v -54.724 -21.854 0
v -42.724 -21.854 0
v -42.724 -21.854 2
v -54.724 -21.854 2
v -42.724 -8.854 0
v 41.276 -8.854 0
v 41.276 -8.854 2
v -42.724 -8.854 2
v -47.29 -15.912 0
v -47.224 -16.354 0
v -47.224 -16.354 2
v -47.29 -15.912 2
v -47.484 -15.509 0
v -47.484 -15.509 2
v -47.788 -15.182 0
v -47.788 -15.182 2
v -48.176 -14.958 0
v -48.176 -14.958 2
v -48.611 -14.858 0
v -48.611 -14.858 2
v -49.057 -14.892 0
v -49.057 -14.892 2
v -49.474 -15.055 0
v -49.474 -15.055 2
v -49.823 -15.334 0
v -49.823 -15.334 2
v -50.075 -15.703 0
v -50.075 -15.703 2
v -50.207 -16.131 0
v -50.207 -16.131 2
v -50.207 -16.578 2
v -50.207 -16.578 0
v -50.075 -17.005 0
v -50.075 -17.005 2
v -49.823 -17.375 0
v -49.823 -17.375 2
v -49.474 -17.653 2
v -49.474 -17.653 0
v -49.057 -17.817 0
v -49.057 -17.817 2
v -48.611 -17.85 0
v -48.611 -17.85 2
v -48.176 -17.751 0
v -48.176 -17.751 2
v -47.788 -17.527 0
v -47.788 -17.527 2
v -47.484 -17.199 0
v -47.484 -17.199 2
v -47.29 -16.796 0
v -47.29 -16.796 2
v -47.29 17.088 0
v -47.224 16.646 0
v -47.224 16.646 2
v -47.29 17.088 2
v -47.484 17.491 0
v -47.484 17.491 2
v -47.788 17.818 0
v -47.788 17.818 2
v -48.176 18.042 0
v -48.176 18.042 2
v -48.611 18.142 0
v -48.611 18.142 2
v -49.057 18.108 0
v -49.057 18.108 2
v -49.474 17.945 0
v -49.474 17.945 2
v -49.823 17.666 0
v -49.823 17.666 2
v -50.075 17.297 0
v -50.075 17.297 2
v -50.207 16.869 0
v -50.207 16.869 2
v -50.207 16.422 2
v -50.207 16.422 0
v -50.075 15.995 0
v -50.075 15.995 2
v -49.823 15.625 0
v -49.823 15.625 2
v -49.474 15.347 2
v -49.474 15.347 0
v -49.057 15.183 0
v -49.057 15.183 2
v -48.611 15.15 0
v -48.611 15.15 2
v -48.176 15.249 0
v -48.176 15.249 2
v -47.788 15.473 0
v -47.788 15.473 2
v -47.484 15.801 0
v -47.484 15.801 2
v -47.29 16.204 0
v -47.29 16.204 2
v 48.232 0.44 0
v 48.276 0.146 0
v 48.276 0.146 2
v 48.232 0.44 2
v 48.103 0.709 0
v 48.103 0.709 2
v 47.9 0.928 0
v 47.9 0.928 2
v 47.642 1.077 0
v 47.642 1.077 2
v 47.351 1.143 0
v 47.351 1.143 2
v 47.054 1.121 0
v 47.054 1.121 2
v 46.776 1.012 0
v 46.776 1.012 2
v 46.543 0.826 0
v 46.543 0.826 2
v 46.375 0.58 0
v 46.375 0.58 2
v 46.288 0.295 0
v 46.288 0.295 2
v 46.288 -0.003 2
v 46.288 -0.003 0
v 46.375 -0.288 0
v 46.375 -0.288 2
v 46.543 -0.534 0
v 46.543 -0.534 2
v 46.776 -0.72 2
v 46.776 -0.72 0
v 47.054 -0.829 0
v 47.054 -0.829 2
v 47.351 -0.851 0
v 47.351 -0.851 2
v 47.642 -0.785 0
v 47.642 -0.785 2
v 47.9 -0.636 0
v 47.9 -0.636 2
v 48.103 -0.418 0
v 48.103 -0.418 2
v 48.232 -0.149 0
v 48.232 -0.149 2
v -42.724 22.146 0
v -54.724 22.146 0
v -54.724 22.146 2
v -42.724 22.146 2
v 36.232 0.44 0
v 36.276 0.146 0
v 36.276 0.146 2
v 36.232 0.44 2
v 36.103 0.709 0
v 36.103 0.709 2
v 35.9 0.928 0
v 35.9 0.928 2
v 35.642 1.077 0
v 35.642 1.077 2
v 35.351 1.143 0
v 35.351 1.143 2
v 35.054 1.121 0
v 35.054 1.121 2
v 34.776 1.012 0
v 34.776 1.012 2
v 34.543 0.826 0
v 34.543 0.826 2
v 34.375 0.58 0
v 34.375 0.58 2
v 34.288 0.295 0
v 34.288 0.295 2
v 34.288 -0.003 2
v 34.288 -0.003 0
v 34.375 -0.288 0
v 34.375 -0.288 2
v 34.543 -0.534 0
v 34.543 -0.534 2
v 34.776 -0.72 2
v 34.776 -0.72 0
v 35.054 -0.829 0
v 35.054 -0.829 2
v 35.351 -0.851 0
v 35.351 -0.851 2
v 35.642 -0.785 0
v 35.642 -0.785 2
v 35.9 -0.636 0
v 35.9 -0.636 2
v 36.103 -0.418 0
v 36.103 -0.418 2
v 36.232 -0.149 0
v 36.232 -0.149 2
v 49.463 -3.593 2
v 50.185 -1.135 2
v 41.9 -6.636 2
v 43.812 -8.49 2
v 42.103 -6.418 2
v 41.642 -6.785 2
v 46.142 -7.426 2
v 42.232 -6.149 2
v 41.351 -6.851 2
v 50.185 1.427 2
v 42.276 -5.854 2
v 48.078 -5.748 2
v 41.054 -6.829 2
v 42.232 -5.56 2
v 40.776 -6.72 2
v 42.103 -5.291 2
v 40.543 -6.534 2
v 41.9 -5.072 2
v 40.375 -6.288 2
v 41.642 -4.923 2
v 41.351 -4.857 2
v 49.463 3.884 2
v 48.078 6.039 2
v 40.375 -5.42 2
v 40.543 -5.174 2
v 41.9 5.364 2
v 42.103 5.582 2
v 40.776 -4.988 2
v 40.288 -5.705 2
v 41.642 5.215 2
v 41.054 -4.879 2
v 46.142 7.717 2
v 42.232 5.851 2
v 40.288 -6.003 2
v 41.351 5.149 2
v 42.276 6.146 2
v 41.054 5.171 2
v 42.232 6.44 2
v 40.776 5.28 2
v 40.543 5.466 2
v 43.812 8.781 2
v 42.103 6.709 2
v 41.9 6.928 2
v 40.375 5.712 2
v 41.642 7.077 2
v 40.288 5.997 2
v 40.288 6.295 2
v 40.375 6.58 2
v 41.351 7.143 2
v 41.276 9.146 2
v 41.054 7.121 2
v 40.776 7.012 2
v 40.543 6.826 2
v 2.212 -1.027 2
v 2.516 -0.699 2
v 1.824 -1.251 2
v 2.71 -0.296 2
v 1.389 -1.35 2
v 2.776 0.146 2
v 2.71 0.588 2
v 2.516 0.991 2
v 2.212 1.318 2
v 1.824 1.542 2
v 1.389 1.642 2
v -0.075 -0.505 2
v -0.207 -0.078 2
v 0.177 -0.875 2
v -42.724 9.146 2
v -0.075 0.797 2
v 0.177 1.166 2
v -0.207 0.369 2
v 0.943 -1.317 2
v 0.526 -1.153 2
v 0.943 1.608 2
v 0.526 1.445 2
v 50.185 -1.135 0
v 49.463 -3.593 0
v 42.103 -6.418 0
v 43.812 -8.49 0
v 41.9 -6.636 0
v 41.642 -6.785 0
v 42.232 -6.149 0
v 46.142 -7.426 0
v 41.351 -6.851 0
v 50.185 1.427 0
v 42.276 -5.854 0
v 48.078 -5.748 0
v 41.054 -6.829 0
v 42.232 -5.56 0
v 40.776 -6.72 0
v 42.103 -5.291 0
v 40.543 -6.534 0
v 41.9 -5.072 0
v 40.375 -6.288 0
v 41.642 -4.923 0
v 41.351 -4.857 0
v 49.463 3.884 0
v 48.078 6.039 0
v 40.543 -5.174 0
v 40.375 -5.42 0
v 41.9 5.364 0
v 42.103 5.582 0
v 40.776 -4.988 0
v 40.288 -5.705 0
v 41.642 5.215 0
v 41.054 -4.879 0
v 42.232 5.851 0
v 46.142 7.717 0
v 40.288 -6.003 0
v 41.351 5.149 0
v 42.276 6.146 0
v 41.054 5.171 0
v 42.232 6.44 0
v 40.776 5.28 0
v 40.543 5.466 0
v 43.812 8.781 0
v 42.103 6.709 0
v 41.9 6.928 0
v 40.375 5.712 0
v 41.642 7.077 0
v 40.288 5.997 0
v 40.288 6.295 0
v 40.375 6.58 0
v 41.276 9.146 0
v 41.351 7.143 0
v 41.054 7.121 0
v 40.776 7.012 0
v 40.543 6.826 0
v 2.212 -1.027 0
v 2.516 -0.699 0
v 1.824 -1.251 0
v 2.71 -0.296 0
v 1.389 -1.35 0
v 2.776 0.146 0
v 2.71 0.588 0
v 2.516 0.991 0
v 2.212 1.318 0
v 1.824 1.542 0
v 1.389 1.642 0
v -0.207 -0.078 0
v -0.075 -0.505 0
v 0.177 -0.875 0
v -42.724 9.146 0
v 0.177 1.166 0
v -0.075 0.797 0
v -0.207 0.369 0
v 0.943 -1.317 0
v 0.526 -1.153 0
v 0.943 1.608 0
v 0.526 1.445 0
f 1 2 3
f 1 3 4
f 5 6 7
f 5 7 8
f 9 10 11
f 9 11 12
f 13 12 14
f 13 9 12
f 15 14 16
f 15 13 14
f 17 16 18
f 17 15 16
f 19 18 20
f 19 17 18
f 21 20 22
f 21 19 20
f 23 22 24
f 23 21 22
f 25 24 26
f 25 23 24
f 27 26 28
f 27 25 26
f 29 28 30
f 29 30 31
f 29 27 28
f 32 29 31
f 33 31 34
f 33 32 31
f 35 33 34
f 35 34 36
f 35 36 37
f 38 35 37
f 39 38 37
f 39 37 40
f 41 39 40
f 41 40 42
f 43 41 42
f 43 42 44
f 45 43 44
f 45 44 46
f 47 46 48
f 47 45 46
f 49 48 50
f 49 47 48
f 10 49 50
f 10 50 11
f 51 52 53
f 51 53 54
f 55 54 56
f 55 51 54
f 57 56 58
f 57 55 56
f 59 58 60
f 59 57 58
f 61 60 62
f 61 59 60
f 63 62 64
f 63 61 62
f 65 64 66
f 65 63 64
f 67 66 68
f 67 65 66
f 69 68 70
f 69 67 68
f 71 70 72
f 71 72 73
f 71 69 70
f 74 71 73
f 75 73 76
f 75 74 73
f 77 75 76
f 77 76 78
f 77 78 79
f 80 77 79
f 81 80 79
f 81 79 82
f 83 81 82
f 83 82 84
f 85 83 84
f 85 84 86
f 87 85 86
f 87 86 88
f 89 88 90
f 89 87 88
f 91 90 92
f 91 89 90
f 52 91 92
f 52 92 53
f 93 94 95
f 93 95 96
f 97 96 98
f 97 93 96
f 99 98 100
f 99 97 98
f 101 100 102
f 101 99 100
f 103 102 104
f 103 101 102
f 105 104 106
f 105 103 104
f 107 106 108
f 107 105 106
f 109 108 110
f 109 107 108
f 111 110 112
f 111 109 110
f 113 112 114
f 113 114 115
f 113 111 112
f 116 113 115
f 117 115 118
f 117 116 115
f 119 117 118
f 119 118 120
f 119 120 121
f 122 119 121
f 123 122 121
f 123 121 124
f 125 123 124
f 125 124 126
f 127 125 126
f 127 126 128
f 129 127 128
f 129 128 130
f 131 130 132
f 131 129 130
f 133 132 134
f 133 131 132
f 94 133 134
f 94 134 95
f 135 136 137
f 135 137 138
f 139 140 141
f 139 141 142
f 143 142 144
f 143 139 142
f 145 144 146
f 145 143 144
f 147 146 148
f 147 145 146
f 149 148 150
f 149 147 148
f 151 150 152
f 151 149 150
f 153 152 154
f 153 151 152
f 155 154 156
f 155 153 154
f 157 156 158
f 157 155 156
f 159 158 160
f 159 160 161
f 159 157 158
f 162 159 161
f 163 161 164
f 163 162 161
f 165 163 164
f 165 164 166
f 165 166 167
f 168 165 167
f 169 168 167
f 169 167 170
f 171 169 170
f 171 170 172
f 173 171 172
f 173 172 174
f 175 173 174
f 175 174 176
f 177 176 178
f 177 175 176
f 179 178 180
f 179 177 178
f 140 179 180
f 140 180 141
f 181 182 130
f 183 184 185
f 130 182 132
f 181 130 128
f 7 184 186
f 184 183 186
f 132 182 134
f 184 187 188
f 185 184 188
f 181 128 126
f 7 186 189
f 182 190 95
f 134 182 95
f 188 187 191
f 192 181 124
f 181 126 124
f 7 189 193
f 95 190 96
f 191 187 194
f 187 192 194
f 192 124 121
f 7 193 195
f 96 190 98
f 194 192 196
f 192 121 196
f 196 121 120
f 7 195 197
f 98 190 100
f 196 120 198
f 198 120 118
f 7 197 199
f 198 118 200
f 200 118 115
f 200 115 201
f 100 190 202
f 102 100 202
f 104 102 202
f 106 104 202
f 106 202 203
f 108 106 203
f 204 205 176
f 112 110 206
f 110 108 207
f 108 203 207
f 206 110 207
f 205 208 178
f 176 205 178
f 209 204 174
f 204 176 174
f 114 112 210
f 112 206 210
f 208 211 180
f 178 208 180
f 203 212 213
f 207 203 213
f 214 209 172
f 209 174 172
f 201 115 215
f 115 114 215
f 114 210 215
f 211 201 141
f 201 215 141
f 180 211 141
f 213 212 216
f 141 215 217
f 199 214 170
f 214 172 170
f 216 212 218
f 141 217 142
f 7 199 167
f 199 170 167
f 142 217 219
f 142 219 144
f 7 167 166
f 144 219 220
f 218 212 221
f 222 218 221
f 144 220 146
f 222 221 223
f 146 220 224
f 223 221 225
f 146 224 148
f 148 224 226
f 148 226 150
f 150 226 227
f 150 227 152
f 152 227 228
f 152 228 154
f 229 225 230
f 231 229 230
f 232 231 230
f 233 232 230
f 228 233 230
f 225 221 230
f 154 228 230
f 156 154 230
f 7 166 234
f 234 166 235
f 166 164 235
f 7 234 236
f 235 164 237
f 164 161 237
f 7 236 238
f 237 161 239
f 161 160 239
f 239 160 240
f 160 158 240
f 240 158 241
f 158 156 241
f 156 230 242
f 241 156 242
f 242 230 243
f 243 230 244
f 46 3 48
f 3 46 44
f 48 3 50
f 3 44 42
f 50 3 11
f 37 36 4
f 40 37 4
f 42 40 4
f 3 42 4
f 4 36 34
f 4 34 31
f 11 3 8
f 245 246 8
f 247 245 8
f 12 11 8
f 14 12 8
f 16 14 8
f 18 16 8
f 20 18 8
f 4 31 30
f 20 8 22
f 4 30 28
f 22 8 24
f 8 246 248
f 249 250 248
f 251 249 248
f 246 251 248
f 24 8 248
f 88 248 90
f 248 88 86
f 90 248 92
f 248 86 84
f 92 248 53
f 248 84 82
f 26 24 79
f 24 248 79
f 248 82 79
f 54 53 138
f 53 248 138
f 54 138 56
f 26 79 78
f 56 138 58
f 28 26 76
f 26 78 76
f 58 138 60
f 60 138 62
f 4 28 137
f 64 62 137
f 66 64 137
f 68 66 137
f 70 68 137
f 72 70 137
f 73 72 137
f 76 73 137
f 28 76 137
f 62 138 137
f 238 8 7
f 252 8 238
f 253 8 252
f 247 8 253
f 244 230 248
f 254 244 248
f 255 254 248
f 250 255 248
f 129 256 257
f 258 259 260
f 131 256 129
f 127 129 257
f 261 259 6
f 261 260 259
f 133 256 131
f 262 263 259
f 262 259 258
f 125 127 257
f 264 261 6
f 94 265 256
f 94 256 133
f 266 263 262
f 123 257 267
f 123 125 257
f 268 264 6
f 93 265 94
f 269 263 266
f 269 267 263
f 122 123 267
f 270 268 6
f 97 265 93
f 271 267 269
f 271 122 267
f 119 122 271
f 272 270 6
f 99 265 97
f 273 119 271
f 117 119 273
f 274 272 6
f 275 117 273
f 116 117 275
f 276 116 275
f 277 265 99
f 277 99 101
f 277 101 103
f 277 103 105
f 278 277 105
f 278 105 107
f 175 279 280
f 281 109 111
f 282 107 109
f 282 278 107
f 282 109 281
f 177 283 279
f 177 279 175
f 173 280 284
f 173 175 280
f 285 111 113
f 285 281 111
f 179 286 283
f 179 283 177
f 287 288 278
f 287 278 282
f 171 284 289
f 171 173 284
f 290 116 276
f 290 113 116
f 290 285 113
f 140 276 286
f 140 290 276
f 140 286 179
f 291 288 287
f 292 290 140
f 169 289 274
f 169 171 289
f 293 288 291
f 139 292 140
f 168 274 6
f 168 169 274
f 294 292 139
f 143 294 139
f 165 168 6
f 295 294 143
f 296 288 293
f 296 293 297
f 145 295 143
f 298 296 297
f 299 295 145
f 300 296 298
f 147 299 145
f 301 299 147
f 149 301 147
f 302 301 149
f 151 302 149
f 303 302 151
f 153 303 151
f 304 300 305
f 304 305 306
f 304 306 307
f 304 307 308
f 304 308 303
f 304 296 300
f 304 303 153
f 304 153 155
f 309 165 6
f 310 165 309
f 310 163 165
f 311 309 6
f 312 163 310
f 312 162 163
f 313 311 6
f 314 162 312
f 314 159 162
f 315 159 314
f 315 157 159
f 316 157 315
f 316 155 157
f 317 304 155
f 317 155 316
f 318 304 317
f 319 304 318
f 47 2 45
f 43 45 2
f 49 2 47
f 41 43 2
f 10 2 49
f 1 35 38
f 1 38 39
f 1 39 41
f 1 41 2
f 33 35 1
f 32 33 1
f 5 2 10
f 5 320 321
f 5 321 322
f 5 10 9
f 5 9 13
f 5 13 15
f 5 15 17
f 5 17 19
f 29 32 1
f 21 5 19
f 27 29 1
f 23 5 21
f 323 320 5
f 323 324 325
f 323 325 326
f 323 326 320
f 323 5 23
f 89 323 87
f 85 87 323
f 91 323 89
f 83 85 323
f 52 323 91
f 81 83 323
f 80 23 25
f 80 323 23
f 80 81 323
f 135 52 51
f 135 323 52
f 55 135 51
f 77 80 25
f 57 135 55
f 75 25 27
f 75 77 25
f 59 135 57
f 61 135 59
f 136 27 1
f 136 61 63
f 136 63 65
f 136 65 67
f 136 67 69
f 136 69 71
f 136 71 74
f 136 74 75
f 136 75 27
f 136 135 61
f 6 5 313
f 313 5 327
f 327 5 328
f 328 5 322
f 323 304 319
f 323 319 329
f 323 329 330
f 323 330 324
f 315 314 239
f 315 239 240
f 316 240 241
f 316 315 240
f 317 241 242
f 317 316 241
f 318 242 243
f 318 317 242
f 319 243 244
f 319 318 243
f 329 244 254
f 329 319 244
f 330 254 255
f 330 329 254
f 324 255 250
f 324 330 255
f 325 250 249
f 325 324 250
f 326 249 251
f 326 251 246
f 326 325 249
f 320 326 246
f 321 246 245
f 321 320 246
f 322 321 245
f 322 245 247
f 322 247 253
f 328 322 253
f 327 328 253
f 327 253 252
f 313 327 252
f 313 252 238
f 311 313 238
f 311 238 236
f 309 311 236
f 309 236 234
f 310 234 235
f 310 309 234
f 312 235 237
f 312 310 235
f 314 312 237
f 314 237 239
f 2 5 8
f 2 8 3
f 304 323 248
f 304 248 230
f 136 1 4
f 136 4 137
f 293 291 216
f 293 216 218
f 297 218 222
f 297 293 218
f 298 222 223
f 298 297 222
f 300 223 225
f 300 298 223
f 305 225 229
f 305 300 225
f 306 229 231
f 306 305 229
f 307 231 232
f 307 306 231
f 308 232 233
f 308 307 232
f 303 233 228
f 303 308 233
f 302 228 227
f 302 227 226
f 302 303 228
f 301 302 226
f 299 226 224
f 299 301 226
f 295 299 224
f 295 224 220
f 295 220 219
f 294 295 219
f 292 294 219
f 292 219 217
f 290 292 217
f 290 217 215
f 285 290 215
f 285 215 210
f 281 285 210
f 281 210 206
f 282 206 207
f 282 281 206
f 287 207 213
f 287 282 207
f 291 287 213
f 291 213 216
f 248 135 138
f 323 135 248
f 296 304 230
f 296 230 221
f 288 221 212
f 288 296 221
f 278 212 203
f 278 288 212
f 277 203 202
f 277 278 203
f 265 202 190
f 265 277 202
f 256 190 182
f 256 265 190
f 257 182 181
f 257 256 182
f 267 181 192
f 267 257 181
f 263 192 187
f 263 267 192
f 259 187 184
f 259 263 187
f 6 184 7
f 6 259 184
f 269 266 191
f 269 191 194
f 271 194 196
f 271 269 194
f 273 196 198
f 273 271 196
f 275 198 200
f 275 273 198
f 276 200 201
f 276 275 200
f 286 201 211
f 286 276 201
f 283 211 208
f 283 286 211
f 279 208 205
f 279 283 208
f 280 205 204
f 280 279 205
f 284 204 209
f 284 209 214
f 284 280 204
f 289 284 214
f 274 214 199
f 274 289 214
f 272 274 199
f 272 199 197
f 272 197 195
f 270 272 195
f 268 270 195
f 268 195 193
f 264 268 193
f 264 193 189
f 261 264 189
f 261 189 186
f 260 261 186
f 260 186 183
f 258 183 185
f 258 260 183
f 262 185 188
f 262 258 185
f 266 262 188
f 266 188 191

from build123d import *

# Parameters (mm, degrees)
SKETCH_1_R      = 1.5
SKETCH_1_R_2    = 1
EXTRUDE_1_DEPTH = 2


with BuildPart() as part:
    # 草图1 → 凸台-拉伸1 (new body)
    with BuildSketch(Plane.XY):
        with BuildLine():
            Line((41.276428571, -8.854285714), (-42.723571429, -8.854285714))
            Line((-42.723571429, -8.854285714), (-42.723571429, -21.854285714))
            Line((-42.723571429, -21.854285714), (-54.723571429, -21.854285714))
            Line((-54.723571429, -21.854285714), (-54.723571429, 22.145714286))
            Line((-54.723571429, 22.145714286), (-42.723571429, 22.145714286))
            Line((-42.723571429, 22.145714286), (-42.723571429, 9.145714286))
            Line((-42.723571429, 9.145714286), (41.276428571, 9.145714286))
            ThreePointArc((41.276428571, 9.145714286), (50.276428571, 0.145714286), (41.276428571, -8.854285714))
        make_face()
        with Locations((1.276428571, 0.145714286)):
            Circle(SKETCH_1_R, mode=Mode.SUBTRACT)
        with Locations((-48.723571429, 16.645714286)):
            Circle(SKETCH_1_R, mode=Mode.SUBTRACT)
        with Locations((-48.723571429, -16.354285714)):
            Circle(SKETCH_1_R, mode=Mode.SUBTRACT)
        with Locations((41.276428571, 6.145714286)):
            Circle(SKETCH_1_R_2, mode=Mode.SUBTRACT)
        with Locations((47.276428571, 0.145714286)):
            Circle(SKETCH_1_R_2, mode=Mode.SUBTRACT)
        with Locations((41.276428571, -5.854285714)):
            Circle(SKETCH_1_R_2, mode=Mode.SUBTRACT)
        with Locations((35.276428571, 0.145714286)):
            Circle(SKETCH_1_R_2, mode=Mode.SUBTRACT)
    extrude(amount=EXTRUDE_1_DEPTH)


solid = part.part
